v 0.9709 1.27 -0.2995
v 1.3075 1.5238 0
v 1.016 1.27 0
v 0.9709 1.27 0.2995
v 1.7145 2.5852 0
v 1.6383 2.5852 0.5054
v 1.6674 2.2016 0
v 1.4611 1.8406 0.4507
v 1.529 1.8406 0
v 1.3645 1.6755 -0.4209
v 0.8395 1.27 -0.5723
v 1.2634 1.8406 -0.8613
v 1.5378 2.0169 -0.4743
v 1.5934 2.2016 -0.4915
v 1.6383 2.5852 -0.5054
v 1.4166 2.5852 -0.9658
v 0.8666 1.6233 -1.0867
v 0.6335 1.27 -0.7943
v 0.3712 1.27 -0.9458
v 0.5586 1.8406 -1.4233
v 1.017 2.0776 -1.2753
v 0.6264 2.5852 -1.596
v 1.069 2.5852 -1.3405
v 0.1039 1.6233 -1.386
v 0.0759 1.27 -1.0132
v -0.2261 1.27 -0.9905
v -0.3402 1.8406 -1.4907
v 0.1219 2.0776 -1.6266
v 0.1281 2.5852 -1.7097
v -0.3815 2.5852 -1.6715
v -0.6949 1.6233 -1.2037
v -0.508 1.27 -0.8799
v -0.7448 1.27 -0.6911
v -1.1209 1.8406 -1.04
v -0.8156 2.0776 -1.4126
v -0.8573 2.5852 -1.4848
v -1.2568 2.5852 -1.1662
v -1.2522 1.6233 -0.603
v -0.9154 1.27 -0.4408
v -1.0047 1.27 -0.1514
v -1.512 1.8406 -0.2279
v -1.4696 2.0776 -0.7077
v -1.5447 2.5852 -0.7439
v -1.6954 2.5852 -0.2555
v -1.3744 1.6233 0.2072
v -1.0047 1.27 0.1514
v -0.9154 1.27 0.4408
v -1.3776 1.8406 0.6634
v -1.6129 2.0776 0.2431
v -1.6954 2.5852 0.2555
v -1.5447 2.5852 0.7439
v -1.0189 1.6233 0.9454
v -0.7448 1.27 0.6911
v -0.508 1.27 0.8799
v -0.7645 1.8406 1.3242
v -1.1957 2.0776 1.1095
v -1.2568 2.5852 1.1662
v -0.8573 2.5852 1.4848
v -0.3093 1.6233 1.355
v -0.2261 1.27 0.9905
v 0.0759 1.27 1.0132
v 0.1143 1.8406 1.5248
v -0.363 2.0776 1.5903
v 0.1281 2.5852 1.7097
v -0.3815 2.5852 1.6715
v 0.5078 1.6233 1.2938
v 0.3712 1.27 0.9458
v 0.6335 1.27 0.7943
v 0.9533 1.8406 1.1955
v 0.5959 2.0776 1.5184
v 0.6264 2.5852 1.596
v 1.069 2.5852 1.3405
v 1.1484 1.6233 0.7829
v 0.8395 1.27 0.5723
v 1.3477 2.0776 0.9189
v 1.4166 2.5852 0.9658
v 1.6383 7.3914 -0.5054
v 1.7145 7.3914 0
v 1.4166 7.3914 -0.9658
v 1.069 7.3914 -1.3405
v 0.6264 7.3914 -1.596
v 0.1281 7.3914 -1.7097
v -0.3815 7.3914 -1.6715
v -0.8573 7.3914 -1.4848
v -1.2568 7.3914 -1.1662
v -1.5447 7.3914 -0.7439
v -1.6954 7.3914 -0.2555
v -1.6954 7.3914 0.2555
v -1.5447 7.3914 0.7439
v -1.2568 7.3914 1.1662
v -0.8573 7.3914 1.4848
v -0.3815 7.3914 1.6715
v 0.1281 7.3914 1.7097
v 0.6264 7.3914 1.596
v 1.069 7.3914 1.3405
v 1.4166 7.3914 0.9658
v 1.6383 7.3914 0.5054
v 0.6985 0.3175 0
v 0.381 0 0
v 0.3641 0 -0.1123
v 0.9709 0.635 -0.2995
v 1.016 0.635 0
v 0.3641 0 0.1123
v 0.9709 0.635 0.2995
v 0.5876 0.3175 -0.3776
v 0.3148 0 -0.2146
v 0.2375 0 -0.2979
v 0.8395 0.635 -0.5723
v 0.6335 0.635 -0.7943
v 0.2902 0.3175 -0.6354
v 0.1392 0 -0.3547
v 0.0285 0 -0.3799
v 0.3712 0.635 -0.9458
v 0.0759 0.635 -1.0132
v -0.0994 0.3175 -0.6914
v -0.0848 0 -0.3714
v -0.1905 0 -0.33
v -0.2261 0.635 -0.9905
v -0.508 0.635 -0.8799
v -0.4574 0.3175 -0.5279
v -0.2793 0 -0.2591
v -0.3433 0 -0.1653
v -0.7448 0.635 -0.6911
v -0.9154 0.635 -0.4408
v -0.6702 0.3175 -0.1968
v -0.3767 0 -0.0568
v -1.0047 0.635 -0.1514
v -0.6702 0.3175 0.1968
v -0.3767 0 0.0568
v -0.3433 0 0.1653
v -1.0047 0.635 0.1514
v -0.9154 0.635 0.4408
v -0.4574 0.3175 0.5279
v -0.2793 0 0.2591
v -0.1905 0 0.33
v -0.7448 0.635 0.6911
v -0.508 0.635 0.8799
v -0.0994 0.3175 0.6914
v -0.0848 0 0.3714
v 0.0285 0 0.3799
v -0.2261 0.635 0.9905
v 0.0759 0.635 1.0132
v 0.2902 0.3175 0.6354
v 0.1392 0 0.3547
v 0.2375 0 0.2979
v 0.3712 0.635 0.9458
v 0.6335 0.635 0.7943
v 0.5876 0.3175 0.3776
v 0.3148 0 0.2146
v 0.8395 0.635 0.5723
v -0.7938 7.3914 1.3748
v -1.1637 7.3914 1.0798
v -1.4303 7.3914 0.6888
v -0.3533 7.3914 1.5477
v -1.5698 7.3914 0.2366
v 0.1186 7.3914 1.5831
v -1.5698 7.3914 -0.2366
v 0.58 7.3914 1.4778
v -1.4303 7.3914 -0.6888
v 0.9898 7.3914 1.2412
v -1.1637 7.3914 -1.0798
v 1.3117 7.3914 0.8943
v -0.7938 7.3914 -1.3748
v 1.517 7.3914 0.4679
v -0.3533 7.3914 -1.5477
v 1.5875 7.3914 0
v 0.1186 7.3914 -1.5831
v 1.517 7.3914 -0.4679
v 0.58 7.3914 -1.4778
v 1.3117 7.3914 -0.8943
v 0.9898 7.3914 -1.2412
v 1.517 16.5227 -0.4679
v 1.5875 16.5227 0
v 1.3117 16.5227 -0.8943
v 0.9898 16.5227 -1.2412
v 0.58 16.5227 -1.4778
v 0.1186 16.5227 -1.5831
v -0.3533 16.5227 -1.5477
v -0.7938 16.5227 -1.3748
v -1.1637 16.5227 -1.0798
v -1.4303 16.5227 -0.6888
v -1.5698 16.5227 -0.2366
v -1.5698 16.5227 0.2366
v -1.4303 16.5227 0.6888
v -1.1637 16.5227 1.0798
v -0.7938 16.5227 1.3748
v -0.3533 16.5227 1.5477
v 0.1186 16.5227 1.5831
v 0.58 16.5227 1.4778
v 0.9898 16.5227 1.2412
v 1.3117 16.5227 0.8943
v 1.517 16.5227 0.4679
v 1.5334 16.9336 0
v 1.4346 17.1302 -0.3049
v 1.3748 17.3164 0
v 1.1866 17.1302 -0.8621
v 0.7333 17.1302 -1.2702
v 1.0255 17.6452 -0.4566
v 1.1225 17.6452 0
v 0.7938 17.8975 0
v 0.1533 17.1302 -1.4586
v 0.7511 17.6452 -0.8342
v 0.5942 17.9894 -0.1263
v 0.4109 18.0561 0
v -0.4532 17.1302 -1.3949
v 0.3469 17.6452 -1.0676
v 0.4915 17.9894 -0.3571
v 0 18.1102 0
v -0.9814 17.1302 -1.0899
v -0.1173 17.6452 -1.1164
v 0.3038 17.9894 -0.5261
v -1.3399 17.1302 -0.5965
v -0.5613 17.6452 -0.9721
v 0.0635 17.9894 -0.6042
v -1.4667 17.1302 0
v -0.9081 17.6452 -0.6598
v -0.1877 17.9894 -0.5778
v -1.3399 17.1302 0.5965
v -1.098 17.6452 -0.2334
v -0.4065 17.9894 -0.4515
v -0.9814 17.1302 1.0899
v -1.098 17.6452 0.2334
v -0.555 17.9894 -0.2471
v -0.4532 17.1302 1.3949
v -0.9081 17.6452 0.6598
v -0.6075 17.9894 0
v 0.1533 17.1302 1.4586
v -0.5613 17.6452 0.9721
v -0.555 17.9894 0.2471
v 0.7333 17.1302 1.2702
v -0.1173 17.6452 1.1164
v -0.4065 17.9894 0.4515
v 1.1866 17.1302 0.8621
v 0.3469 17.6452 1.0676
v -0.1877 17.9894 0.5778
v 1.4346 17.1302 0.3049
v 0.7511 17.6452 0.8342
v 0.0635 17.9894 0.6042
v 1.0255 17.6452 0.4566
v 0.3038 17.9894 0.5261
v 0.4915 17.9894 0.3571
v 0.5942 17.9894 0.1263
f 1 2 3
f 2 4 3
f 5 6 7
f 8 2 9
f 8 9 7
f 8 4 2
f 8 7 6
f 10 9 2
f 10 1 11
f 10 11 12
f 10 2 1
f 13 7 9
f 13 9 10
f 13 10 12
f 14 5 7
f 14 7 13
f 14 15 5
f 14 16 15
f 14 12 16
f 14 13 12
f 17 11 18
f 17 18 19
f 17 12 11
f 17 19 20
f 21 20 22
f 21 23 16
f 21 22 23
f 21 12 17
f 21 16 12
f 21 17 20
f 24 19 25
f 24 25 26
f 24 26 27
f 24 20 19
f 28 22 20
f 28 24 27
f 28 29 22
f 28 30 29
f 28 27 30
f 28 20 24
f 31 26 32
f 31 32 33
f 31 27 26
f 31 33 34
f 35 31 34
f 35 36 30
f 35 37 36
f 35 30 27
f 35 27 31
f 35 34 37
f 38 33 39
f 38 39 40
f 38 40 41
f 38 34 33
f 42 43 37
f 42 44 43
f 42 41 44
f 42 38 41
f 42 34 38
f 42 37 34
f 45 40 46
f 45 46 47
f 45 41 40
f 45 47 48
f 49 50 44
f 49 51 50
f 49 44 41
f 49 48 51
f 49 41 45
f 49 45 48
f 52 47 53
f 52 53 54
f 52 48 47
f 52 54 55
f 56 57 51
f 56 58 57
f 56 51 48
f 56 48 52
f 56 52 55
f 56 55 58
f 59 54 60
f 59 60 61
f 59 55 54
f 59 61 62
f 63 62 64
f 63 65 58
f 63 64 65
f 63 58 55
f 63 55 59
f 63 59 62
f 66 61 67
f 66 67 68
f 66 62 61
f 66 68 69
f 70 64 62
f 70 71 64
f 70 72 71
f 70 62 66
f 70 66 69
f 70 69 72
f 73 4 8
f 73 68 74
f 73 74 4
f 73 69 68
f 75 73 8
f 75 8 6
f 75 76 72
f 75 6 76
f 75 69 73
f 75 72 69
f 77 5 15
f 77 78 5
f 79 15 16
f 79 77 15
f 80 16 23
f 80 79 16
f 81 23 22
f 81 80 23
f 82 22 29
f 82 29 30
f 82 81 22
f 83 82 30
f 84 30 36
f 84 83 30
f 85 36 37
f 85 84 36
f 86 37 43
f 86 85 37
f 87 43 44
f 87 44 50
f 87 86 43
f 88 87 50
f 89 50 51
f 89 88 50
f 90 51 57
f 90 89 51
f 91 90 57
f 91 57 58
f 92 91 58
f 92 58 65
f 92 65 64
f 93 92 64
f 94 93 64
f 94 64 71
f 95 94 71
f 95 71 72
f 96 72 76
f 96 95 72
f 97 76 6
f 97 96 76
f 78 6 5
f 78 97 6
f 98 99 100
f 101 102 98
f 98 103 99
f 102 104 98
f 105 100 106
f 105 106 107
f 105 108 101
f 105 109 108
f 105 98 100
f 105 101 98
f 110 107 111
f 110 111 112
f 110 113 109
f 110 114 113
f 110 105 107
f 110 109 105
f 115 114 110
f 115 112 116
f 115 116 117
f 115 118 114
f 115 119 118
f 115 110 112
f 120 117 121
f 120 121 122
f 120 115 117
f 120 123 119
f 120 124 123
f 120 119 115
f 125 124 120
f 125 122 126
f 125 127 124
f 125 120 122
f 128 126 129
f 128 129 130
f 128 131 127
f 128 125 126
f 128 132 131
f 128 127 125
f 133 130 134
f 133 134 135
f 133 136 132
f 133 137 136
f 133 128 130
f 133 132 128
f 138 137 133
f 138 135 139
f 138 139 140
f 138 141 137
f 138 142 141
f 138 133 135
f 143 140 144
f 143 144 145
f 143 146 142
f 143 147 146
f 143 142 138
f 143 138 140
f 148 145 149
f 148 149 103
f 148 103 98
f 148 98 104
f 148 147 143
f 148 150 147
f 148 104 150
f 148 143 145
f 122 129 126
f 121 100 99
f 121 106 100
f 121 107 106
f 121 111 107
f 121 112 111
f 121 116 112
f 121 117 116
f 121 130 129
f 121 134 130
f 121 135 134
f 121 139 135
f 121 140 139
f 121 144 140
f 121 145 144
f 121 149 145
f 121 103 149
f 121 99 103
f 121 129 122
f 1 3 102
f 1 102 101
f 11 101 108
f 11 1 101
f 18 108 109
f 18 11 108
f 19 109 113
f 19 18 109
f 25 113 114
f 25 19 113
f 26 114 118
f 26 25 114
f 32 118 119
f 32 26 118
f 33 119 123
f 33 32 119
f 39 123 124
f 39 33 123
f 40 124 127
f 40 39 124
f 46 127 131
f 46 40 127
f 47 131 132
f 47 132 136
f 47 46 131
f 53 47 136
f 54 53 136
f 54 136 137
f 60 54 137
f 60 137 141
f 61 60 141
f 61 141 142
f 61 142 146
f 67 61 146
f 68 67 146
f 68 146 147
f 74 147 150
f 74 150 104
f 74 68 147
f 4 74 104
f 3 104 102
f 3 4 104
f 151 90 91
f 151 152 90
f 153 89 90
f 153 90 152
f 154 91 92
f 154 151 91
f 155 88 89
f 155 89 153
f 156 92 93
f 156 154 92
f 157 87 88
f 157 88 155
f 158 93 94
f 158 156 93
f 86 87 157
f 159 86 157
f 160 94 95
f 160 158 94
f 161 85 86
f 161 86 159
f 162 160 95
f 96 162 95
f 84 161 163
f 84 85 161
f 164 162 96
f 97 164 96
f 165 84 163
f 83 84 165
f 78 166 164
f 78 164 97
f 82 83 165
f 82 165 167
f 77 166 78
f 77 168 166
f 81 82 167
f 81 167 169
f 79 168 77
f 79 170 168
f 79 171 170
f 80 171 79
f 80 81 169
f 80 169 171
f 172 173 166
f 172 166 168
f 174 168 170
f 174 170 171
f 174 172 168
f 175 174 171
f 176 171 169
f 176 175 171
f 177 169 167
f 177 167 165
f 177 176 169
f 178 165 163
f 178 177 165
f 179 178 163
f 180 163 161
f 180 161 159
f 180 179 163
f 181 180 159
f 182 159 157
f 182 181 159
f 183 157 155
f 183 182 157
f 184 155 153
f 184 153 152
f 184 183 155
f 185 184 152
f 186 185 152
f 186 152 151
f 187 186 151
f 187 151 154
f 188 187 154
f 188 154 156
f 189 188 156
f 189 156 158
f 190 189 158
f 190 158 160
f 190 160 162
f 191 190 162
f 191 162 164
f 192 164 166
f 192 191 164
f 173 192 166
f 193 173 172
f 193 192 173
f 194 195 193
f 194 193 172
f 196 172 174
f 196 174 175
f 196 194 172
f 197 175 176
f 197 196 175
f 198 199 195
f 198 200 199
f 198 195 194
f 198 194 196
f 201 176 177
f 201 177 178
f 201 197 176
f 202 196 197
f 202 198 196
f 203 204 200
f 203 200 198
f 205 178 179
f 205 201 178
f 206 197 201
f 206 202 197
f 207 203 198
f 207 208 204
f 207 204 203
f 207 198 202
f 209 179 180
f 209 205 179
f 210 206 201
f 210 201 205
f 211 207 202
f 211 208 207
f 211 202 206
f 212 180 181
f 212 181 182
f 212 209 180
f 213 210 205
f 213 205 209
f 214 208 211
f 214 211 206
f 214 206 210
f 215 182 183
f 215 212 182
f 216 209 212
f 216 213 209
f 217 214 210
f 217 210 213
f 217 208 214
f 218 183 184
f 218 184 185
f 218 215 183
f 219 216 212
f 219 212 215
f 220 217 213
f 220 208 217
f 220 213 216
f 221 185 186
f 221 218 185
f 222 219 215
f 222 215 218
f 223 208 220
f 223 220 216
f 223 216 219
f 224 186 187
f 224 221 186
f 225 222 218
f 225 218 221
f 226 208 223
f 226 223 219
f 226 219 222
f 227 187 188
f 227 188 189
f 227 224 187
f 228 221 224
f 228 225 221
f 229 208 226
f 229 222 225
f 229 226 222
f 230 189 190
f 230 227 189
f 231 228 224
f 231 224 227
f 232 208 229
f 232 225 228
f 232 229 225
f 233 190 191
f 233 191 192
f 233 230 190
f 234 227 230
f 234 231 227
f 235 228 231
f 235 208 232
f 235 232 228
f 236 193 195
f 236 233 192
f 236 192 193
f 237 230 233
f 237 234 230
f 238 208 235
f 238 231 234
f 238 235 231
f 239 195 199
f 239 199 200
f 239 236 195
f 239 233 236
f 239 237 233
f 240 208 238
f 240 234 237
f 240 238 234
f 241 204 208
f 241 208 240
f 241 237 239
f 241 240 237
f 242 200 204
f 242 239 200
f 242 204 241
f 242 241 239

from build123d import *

# Parameters (mm, degrees)
FILLET1_R     = 1.5875
CHAMFER1_SIZE = 0.635


with BuildPart() as part:
    # Sketch1 → Revolve1 (revolve)
    with BuildSketch(Plane.XY):
        Polygon((0, 0), (1.016, 0), (1.016, 1.27), (1.7145, 1.27), (1.7145, 7.3914), (1.5875, 7.3914), (1.5875, 18.1102), (0, 18.1102), align=None)
    revolve(axis=Axis((0, 0, 0), (0, 1, 0)))

    # Fillet1
    # the kernel refuses this fillet: 1.5875 mm, written as the material it takes off along each edge
    with BuildSketch(Plane(origin=(0, 18.1102, 0), x_dir=(1, 0, 0), z_dir=(0, 0, 1))) as fillet1_piece_1:
        with BuildLine():
            CenterArc((1.5875 - FILLET1_R, -FILLET1_R), FILLET1_R, 0, 90)
            Line((1.5875 - FILLET1_R, 0), (1.5875 - FILLET1_R, FILLET1_R * 0.02))
            Line((1.5875 - FILLET1_R, FILLET1_R * 0.02), (1.5875, FILLET1_R * 0.02))
            Line((1.5875, FILLET1_R * 0.02), (1.5875 + FILLET1_R * 0.02, 0))
            Line((1.5875 + FILLET1_R * 0.02, 0), (1.5875 + FILLET1_R * 0.02, -FILLET1_R))
            Line((1.5875 + FILLET1_R * 0.02, -FILLET1_R), (1.5875, -FILLET1_R))
        make_face()
    revolve(axis=Axis((0, 18.1102, 0), (0, 1, 0)), mode=Mode.SUBTRACT)
    with BuildSketch(Plane(origin=(0, 1.27, 0), x_dir=(1, 0, 0), z_dir=(0, 0, 1))) as fillet1_piece_2:
        with BuildLine():
            CenterArc((0.127, 1.315232014), FILLET1_R, 304.055797743, 55.944202257)
            Line((1.7145, 1.315232014), (1.74625, 1.315232014))
            Line((1.74625, 1.315232014), (1.74625, 0))
            Line((1.74625, 0), (1.7145, -0.03175))
            ThreePointArc((1.7145, -0.03175), (1.36525, -0.03175), (1.03378, -0.02630464))
            Line((1.03378, -0.02630464), (1.016, 0))
        make_face()
    revolve(axis=Axis((0, 1.27, 0), (0, 1, 0)), mode=Mode.SUBTRACT)

    # Chamfer1
    chamfer1_edges = [part.edges().sort_by_distance(p)[0] for p in [
        (-1.016, 0, 0),
    ]]
    chamfer(chamfer1_edges, length=CHAMFER1_SIZE)


solid = part.part
